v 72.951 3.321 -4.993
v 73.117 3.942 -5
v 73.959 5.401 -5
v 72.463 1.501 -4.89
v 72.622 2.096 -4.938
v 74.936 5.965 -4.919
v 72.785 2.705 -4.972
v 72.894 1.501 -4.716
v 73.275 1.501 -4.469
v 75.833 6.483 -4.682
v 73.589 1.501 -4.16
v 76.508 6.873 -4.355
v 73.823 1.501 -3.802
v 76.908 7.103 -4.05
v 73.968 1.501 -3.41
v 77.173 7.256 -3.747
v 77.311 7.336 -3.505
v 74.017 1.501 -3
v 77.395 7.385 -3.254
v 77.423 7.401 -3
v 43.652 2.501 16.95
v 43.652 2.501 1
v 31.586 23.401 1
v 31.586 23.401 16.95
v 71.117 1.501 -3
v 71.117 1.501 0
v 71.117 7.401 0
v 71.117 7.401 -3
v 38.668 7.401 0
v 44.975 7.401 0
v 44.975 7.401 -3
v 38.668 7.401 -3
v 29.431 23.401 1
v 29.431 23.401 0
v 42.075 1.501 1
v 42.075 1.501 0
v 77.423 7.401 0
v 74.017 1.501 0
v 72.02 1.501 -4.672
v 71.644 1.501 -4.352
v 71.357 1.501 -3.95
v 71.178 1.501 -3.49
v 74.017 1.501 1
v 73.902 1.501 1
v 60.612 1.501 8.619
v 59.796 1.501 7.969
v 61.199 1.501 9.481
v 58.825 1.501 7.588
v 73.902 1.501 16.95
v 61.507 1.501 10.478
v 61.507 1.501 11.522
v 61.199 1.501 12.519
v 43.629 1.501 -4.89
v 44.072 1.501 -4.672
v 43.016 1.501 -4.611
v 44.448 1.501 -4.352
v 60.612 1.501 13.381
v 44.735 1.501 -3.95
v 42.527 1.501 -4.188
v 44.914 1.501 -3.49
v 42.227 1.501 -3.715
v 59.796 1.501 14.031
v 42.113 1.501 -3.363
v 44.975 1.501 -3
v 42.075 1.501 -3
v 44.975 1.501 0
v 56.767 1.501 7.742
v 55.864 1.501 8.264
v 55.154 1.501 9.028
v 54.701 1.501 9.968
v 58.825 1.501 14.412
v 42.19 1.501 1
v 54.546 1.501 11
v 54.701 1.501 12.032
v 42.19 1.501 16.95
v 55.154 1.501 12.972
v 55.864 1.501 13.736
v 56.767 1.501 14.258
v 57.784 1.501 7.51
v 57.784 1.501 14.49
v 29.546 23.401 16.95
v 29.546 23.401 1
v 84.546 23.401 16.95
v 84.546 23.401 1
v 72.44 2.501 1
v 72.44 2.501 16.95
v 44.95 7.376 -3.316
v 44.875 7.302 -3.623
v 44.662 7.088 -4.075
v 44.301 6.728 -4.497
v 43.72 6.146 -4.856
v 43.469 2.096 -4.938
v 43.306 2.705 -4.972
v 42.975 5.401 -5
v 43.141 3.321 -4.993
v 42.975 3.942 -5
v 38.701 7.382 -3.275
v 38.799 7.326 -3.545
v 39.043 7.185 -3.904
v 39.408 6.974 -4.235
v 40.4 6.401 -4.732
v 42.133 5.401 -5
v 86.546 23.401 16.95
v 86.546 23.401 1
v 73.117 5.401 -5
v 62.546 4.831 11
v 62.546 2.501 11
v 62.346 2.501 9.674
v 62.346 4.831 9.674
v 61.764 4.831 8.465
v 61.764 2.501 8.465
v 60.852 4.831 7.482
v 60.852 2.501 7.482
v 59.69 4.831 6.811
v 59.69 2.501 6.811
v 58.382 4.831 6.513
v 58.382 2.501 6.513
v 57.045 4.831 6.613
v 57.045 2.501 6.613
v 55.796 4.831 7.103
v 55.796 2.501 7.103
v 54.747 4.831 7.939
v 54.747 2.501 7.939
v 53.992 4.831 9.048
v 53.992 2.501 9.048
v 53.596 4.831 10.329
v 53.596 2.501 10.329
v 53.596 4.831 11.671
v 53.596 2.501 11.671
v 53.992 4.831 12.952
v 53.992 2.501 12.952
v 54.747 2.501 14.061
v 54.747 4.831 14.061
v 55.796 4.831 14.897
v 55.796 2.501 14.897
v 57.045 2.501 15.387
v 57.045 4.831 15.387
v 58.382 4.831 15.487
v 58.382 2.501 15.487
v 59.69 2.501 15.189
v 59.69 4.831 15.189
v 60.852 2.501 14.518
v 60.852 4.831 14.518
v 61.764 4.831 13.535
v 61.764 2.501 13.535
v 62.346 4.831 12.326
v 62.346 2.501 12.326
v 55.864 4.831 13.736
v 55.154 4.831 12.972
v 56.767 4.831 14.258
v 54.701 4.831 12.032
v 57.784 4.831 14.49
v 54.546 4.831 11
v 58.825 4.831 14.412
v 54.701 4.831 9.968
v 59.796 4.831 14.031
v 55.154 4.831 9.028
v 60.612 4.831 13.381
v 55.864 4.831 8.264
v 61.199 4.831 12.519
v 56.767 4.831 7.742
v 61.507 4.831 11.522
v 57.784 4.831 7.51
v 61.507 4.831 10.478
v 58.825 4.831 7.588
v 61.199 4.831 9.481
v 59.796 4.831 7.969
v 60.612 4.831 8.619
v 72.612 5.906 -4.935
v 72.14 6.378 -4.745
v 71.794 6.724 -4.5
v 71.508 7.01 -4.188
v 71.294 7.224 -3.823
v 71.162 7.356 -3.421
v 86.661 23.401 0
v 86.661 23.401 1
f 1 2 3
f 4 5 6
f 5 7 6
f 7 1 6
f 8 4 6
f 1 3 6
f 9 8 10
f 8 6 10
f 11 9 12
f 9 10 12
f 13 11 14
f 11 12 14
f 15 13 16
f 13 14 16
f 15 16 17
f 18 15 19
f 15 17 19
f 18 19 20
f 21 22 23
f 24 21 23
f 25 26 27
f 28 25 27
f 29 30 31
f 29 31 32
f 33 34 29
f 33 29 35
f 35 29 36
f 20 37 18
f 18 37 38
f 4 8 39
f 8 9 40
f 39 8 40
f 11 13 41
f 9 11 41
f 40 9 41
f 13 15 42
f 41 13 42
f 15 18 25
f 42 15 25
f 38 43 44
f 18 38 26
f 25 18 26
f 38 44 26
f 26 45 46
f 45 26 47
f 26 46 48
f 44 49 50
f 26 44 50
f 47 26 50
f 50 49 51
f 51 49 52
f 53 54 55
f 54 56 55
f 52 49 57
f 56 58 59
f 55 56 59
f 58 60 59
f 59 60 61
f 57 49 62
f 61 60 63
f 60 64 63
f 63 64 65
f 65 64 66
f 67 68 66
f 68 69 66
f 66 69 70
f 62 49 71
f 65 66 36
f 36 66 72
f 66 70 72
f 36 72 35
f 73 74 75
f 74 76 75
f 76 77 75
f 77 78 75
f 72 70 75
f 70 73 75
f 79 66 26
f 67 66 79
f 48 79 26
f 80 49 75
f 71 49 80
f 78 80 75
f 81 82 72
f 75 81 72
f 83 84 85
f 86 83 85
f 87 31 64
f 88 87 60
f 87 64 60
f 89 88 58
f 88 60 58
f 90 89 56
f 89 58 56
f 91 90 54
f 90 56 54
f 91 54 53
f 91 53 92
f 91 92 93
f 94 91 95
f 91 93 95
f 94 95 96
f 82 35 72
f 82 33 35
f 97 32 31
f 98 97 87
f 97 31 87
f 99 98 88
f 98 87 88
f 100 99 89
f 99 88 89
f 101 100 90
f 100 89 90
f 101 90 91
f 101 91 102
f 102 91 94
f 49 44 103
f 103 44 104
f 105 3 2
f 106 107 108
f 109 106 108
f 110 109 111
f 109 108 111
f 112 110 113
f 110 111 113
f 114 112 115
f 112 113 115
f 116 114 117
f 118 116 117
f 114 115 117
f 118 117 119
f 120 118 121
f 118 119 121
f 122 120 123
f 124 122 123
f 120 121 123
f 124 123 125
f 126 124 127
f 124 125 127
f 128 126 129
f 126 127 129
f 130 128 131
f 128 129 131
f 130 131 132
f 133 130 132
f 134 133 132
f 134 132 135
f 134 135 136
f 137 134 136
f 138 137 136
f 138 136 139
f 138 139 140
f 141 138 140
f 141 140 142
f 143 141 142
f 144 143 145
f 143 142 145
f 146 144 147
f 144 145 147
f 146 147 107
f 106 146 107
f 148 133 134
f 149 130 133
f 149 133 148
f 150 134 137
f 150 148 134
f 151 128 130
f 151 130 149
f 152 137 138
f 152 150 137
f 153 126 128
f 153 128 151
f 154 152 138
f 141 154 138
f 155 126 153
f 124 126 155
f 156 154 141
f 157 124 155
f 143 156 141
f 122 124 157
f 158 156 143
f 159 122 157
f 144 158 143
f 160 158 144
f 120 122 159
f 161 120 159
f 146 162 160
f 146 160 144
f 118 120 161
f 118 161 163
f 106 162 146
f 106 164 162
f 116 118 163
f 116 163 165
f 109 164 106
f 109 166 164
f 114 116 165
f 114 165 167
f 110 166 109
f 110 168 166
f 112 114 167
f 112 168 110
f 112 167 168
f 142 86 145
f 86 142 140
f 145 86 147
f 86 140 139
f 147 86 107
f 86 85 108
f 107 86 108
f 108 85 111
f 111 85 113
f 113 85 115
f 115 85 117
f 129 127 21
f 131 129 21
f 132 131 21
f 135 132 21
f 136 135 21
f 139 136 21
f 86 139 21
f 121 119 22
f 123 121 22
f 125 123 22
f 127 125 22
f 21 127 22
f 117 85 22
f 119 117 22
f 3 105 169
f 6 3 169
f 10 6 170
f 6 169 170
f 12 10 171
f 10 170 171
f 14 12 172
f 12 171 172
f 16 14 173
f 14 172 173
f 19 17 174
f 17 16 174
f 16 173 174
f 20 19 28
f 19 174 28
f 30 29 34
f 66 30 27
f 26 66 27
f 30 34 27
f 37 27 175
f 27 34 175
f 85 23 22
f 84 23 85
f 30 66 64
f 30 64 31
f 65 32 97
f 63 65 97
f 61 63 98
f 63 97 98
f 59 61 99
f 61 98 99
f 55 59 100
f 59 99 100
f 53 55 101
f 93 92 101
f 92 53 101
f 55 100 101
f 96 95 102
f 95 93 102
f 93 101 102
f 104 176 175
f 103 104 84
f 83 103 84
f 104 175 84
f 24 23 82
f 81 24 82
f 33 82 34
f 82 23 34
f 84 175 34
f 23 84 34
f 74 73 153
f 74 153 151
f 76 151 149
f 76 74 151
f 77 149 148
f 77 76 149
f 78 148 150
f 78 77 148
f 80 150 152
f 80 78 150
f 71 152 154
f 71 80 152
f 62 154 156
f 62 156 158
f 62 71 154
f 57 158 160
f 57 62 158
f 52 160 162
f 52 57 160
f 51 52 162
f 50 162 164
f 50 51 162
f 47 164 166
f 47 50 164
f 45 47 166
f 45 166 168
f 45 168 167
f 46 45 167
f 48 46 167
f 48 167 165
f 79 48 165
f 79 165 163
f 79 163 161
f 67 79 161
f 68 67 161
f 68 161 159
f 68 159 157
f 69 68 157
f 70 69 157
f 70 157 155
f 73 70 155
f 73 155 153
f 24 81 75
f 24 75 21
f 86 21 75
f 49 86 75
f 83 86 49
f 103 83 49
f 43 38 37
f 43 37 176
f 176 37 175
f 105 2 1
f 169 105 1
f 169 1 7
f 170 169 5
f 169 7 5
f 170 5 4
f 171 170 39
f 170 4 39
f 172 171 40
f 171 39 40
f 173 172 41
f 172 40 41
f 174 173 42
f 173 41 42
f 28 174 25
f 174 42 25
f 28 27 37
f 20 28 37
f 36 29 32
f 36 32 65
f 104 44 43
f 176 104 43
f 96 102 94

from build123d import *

# Parameters (mm, degrees)
BOSS_EXTRUDE1_DEPTH = 1
BOSS_EXTRUDE2_DEPTH = 5
FILLET1_R           = 2
BOSS_EXTRUDE3_DEPTH = 15.95
SKETCH10_R          = 4.5
SKETCH10_R_2        = 3.5
BOSS_EXTRUDE7_DEPTH = 2.33
CUT_EXTRUDE1_START  = -1
SKETCH13_R          = 3.5
CUT_EXTRUDE1_DEPTH  = 1


with BuildPart() as part:
    # Sketch1 → Boss-Extrude1 (new body)
    with BuildSketch(Plane.XY):
        Polygon((86.661024886, 23.401143993), (29.430818123, 23.401143993), (42.074789018, 1.501143993), (74.017053991, 1.501143993), align=None)
    extrude(amount=BOSS_EXTRUDE1_DEPTH)

    # Sketch2 → Boss-Extrude2 (add)
    with BuildSketch(Plane(origin=(0, 0, 0), x_dir=(-1, 0, 0), z_dir=(0, 0, -1))):
        Polygon((-74.017053991, 1.501143993), (-71.117053991, 1.501143993), (-71.117053991, 7.401143993), (-77.423420579, 7.401143993), align=None)
        Polygon((-42.074789018, 1.501143993), (-44.974789018, 1.501143993), (-44.974789018, 7.401143993), (-38.66842243, 7.401143993), align=None)
    extrude(amount=BOSS_EXTRUDE2_DEPTH)

    # Fillet1
    # the kernel refuses this fillet: 2 mm, written as the material it takes off along each edge
    with BuildSketch(Plane(origin=(44.974789018, -3.498856007, -5), x_dir=(-1, 0, 0), z_dir=(0, 1, 0)), Plane(origin=(71.117053991, -3.498856007, -5), x_dir=(0, 0, 1), z_dir=(0, 1, 0))) as fillet1_piece_1:
        with BuildLine():
            CenterArc((FILLET1_R, FILLET1_R), FILLET1_R, 180, 90)
            Line((0, FILLET1_R), (0, 0))
            Line((0, 0), (FILLET1_R, 0))
        make_face()
    extrude(amount=15.9, mode=Mode.SUBTRACT)
    with BuildSketch(Plane(origin=(49.974789018, 7.401143993, -5), x_dir=(0, -1, 0), z_dir=(-1, 0, 0)), Plane(origin=(66.117053991, 7.401143993, -5), x_dir=(0, 0, 1), z_dir=(1, 0, 0))) as fillet1_piece_2:
        with BuildLine():
            CenterArc((FILLET1_R, FILLET1_R), FILLET1_R, 180, 90)
            Line((0, FILLET1_R), (0, 0))
            Line((0, 0), (FILLET1_R, 0))
        make_face()
    extrude(amount=16.306366588, mode=Mode.SUBTRACT)
    with BuildSketch(Plane(origin=(36.16842243, 11.731271012, -5), x_dir=(0.8660254037844386, 0.5000000000000002, 0), z_dir=(0.5000000000000002, -0.8660254037844386, 0))) as fillet1_piece_3:
        with BuildLine():
            CenterArc((FILLET1_R, FILLET1_R), FILLET1_R, 180, 90)
            Line((0, FILLET1_R), (0, 0))
            Line((0, 0), (FILLET1_R, 0))
        make_face()
    extrude(amount=16.812733176, mode=Mode.SUBTRACT)
    with BuildSketch(Plane(origin=(79.923420579, 11.731271012, -5), x_dir=(-0.866025403784438, 0.500000000000001, 0), z_dir=(-0.500000000000001, -0.8660254037844382, 0))) as fillet1_piece_4:
        with BuildLine():
            CenterArc((FILLET1_R, -FILLET1_R), FILLET1_R, 90, 90)
            Line((0, -FILLET1_R), (0, 0))
            Line((0, 0), (FILLET1_R, 0))
        make_face()
    extrude(amount=16.812733176, mode=Mode.SUBTRACT)

    # Sketch4 → Boss-Extrude3 (add)
    with BuildSketch(Plane.XY.offset(1)):
        Polygon((42.190259072, 1.501143993), (73.901583937, 1.501143993), (86.545554832, 23.401143993), (84.545554832, 23.401143993), (72.439703722, 2.501143993), (43.652139287, 2.501143993), (31.585518661, 23.401143993), (29.546288176, 23.401143993), align=None)
    extrude(amount=BOSS_EXTRUDE3_DEPTH)

    # Sketch10 → Boss-Extrude7 (add)
    with BuildSketch(Plane(origin=(0, 2.501143993, 0), x_dir=(1, 0, 0), z_dir=(0, 1, 0))):
        with Locations((58.045921504, -11)):
            Circle(SKETCH10_R)
        with Locations(Location((58.045921504, -11, 0), (0, 0, 180))):
            Circle(SKETCH10_R_2, mode=Mode.SUBTRACT)
    extrude(amount=BOSS_EXTRUDE7_DEPTH)

    # Sketch13 → Cut-Extrude1 (cut)
    with BuildSketch(Plane(origin=(0, 2.501143993, 0), x_dir=(1, 0, 0), z_dir=(0, 1, 0)).offset(CUT_EXTRUDE1_START)):
        with Locations(Location((58.045921504, -11, 0), (0, 0, 180))):
            Circle(SKETCH13_R)
    extrude(amount=CUT_EXTRUDE1_DEPTH, mode=Mode.SUBTRACT)


solid = part.part
